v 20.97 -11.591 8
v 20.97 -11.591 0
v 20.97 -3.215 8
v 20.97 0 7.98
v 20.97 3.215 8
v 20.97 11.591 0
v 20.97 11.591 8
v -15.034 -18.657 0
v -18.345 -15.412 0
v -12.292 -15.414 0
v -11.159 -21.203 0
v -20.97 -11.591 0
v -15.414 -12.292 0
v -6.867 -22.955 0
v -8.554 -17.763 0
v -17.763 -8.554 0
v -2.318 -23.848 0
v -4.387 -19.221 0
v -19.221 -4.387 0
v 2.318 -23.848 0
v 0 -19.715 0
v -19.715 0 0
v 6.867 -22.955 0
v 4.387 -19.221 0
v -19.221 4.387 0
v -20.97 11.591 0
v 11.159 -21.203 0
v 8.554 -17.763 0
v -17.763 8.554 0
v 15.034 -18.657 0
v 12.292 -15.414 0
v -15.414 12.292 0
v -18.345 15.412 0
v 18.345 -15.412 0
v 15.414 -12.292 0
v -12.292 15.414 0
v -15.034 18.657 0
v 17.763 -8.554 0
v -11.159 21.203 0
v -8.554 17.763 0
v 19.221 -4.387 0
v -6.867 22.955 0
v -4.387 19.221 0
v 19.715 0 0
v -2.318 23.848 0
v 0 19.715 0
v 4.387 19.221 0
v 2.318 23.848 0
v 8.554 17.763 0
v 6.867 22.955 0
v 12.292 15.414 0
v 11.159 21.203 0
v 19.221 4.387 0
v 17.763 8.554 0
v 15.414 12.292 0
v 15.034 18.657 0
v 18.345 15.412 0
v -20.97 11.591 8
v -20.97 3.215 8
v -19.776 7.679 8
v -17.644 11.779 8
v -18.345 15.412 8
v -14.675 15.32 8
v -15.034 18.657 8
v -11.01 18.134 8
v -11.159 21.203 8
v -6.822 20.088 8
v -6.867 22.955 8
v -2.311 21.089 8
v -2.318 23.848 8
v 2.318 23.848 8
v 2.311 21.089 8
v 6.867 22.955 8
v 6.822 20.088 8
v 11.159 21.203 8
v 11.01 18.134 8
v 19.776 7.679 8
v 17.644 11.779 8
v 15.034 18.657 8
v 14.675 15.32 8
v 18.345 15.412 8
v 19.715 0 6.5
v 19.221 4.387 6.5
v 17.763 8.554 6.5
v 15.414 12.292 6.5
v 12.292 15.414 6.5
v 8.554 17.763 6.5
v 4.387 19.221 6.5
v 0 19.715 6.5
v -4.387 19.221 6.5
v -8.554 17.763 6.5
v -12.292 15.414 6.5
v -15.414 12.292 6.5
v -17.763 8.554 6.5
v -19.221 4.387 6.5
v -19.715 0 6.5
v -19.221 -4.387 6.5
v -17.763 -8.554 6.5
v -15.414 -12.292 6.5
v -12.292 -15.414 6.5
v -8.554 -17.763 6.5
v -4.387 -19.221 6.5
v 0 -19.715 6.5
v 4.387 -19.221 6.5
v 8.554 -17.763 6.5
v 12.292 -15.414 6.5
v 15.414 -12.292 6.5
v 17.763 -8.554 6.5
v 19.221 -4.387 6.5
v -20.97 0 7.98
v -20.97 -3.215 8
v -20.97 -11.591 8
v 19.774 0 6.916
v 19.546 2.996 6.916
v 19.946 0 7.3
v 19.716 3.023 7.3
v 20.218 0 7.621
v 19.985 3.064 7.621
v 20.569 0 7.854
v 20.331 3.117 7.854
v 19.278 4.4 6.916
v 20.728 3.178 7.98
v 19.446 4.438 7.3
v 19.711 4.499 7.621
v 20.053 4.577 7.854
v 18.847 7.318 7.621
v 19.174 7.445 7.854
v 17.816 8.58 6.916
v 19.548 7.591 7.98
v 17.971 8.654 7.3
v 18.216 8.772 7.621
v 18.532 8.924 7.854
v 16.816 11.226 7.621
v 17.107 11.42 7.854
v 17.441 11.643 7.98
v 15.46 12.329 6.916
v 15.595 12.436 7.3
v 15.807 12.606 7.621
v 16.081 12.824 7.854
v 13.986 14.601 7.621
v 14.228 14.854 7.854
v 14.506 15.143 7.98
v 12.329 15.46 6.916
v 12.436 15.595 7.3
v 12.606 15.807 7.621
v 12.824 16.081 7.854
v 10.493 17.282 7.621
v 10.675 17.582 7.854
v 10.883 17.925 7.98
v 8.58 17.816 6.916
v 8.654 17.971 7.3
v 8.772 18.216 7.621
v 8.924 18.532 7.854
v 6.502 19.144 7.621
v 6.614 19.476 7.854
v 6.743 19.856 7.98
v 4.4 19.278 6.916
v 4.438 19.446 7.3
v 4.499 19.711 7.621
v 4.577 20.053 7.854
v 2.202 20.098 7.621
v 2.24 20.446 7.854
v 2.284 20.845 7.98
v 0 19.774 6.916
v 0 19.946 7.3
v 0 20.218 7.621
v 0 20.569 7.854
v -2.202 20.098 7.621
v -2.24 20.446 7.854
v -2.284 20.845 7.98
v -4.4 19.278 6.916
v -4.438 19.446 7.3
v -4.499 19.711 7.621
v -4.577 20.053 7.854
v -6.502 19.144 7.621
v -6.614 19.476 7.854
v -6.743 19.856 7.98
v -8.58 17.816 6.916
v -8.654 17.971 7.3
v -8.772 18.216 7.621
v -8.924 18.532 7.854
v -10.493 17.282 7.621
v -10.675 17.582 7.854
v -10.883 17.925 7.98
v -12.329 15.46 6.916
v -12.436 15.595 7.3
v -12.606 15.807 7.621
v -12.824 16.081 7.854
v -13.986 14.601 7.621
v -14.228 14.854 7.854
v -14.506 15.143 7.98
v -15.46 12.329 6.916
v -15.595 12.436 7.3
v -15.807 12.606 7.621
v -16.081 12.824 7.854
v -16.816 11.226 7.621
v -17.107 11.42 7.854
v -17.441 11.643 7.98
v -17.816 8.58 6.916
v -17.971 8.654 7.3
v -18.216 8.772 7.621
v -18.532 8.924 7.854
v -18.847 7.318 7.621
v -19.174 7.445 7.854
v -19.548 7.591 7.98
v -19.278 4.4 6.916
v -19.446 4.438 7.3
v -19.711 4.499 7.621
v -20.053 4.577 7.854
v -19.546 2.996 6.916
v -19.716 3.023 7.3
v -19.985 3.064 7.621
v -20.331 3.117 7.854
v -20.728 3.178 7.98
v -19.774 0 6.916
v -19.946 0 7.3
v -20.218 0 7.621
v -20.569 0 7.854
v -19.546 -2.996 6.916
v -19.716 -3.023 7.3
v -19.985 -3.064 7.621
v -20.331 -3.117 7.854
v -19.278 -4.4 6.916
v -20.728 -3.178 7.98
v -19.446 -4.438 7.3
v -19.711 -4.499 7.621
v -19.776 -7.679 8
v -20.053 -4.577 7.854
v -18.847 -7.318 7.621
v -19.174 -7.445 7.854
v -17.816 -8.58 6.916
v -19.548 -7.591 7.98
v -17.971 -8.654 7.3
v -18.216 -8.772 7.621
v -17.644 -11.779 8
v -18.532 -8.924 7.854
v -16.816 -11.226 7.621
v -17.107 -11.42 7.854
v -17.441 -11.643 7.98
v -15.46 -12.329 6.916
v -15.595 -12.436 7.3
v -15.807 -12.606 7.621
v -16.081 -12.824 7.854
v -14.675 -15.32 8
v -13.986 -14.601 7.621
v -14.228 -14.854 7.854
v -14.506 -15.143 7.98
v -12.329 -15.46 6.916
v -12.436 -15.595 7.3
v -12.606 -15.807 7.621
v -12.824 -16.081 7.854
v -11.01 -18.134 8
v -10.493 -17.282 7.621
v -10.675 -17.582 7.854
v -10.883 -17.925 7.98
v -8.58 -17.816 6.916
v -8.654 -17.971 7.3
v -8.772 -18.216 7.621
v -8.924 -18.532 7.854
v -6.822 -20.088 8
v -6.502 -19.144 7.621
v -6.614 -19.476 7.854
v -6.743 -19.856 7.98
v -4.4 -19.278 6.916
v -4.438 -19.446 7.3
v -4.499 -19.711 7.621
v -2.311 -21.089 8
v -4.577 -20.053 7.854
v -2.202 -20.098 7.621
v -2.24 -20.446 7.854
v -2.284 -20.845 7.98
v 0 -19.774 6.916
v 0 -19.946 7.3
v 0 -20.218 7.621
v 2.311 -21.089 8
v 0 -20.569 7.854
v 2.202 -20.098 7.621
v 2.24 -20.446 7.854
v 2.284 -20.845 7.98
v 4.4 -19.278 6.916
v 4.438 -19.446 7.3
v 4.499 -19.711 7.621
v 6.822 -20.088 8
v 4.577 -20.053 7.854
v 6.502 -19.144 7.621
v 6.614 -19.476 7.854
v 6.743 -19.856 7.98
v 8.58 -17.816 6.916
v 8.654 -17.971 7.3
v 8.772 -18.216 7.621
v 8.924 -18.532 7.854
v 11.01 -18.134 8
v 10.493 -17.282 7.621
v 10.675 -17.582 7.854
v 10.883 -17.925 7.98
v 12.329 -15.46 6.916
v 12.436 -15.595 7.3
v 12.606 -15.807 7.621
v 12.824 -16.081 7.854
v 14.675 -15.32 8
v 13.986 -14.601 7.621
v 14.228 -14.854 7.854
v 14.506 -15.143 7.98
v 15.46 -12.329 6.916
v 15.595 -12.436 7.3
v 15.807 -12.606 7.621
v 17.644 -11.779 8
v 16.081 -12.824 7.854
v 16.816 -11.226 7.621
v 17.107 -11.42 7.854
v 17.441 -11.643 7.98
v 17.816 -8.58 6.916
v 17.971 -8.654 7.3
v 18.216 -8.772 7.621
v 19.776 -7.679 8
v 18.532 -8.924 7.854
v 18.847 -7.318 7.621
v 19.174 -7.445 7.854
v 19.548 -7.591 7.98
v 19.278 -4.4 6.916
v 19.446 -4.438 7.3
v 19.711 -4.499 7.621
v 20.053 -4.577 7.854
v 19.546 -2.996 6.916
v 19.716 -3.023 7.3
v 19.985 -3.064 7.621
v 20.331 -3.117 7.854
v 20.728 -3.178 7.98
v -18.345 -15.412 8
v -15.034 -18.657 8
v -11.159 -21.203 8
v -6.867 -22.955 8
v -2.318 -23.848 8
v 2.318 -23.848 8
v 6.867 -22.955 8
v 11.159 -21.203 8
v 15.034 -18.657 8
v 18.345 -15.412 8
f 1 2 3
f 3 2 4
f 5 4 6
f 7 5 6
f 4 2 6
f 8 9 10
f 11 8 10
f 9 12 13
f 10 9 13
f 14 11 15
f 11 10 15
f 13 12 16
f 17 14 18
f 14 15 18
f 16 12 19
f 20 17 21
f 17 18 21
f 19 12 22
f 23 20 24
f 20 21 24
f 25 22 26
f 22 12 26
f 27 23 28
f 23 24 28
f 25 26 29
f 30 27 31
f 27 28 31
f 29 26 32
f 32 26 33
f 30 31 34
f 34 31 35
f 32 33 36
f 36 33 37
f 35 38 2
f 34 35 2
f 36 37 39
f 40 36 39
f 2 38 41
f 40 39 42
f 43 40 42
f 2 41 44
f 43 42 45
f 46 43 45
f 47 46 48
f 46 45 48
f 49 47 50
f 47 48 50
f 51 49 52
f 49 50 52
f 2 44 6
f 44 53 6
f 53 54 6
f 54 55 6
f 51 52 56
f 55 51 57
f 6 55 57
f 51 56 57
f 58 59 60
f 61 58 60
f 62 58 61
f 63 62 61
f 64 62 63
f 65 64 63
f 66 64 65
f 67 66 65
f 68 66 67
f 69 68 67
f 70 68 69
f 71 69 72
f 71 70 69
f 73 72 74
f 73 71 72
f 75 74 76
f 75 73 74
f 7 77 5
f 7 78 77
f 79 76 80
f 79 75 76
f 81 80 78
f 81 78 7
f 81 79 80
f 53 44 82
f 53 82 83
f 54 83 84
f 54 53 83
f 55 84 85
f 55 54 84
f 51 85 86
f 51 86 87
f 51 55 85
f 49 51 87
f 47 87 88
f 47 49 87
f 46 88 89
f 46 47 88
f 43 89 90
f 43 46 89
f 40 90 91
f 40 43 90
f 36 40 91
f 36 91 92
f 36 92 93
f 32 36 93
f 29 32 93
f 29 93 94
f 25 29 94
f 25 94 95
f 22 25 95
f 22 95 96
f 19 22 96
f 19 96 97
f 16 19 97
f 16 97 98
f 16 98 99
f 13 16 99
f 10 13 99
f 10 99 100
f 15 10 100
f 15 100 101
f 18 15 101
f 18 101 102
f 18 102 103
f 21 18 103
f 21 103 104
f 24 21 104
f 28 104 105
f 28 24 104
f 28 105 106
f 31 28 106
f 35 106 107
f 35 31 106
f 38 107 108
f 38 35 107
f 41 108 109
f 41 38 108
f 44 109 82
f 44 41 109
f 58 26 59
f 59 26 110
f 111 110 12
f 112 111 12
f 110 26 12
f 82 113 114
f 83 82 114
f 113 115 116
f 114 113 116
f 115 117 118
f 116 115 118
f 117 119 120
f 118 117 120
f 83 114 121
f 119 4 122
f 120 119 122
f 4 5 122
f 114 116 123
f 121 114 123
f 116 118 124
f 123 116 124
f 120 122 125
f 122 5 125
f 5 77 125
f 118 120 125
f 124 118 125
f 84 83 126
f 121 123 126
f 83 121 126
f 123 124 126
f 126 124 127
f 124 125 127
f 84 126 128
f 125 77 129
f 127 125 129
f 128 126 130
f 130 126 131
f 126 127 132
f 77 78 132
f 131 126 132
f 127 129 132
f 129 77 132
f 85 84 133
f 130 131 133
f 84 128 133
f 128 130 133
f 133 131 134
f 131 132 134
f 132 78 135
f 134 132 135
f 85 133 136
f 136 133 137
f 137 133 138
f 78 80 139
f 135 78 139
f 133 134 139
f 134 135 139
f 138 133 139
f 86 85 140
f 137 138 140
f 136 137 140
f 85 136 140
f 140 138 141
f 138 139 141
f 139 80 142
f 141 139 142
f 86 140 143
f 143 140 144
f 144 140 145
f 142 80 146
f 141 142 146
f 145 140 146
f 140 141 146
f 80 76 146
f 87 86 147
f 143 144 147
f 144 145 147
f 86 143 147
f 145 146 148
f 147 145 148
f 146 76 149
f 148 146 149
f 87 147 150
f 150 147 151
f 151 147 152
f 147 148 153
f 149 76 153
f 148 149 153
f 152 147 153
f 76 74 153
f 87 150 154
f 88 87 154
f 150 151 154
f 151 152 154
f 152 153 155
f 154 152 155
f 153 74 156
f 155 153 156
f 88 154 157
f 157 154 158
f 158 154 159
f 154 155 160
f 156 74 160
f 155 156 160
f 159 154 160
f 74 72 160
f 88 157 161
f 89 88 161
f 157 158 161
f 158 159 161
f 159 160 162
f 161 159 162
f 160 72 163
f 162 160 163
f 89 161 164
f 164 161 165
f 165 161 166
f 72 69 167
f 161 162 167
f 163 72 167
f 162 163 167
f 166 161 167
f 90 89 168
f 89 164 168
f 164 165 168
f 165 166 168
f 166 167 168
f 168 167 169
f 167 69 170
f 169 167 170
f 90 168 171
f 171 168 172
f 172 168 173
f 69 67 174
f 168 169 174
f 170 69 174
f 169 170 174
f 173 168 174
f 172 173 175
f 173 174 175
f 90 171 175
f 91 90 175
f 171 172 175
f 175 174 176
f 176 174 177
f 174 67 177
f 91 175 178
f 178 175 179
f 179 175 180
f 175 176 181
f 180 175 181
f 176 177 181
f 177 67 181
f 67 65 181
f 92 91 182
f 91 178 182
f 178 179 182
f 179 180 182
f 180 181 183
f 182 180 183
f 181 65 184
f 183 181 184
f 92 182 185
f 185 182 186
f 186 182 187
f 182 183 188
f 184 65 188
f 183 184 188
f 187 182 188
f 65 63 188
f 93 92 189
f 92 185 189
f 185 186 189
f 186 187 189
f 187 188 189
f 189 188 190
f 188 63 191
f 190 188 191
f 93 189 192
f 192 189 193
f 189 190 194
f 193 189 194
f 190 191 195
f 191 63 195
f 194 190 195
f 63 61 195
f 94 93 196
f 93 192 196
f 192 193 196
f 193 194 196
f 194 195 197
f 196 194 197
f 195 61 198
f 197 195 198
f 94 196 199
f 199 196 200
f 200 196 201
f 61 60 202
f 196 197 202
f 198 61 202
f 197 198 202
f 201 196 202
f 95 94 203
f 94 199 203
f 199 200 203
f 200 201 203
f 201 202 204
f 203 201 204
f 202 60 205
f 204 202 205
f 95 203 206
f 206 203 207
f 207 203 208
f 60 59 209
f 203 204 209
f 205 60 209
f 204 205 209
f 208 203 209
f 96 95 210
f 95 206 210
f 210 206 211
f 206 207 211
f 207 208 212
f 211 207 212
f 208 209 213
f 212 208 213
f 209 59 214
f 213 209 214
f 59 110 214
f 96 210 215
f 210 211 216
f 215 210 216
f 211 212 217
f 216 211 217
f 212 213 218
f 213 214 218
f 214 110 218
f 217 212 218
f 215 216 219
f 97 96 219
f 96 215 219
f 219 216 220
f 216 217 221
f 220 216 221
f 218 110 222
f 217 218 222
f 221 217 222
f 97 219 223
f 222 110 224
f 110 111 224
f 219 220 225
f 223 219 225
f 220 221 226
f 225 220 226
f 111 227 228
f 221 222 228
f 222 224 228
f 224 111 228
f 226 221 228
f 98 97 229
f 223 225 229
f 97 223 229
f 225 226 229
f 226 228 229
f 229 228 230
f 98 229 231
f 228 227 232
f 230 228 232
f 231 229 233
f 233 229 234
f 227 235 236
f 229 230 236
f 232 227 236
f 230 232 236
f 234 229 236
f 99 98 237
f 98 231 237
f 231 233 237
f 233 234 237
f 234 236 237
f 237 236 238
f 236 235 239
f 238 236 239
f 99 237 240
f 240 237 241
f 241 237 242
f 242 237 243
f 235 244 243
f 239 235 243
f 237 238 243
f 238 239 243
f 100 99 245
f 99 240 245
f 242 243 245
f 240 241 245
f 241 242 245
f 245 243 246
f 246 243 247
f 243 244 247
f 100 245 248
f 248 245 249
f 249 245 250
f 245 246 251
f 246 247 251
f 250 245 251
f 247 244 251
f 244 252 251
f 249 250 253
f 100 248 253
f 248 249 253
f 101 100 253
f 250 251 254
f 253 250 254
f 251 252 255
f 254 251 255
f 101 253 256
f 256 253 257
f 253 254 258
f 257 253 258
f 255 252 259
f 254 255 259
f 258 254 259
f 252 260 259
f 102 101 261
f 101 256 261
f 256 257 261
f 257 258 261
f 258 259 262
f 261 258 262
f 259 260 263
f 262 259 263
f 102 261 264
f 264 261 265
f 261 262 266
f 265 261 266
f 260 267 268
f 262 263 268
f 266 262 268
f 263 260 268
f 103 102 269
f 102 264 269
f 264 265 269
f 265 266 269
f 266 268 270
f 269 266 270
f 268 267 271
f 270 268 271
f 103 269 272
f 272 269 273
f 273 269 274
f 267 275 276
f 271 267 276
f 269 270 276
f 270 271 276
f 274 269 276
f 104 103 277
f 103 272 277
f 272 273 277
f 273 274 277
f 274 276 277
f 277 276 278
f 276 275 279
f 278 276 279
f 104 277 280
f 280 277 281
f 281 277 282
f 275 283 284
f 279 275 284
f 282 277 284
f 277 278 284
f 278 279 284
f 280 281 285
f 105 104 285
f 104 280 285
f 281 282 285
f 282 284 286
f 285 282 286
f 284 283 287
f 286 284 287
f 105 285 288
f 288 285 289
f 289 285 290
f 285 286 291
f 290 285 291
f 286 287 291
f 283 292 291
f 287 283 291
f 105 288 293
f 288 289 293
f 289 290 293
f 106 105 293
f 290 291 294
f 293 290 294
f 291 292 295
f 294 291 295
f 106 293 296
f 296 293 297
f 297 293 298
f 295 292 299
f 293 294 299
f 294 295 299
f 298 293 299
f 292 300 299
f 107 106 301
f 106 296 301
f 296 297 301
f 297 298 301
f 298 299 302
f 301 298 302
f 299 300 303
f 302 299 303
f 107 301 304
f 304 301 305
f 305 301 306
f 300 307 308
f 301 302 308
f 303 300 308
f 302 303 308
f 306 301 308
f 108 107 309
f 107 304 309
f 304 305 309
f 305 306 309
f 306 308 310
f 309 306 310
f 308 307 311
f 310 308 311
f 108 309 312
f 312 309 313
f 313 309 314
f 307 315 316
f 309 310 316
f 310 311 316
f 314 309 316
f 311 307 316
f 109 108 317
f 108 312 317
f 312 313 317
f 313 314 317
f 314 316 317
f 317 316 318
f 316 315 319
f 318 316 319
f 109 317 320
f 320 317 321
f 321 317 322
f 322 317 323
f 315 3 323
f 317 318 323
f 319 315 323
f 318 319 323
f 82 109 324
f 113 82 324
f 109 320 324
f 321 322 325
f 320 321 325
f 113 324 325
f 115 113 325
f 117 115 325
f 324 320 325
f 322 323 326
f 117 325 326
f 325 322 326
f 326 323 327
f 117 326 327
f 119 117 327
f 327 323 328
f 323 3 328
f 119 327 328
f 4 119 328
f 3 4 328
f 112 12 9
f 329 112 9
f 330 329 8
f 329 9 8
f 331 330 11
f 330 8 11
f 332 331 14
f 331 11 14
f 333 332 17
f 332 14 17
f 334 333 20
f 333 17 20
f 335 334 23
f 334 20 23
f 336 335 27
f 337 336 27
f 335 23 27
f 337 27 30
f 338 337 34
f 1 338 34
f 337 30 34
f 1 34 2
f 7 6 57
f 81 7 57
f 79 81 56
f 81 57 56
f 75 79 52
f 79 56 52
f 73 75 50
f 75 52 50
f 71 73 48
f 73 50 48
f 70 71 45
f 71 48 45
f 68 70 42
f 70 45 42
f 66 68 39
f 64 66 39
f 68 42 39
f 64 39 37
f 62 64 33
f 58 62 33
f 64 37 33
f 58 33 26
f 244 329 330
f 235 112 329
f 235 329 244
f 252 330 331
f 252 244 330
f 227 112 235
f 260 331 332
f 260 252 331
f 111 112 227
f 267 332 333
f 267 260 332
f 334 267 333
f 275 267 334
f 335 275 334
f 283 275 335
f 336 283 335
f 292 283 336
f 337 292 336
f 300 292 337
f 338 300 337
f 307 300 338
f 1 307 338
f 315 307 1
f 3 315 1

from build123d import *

# Parameters (mm, degrees)
F0_R     = 19.715
F1_DEPTH = 8


# Not quite as in the source:
# - a fillet or chamfer that OpenCascade refuses, or shapes differently, is made with other operations: its cross-section is extruded or revolved along the edge and cut away or added


with BuildPart() as f1:
    # F0 (on Top) → F1 (new body)
    with BuildSketch(Plane.XY):
        with BuildLine():
            Line((20.97, -11.5905435593), (20.97, 11.5905435593))
            ThreePointArc((20.97, 11.5905435593), (0, 23.96), (-20.97, 11.5905435593))
            Line((-20.97, 11.5905435593), (-20.97, -11.5905435593))
            ThreePointArc((-20.97, -11.5905435593), (0, -23.96), (20.97, -11.5905435593))
        make_face()
        Circle(F0_R, mode=Mode.SUBTRACT)
    extrude(amount=F1_DEPTH)

    # F2: fillet of radius 1.5 on 1 edges, made by hand

    # F2_s1 → F2_t2 (revolve, cut)
    with BuildSketch(Plane.XZ):
        with BuildLine():
            ThreePointArc((19.715, 6.5), (20.1543398282, 7.5606601718), (21.215, 8))
            Line((21.215, 8), (19.715, 8))
            Line((19.715, 8), (19.715, 6.5))
        make_face()
    revolve(axis=Axis((0, 0, 8), (0, 0, 1)), mode=Mode.SUBTRACT)


solid = f1.part
